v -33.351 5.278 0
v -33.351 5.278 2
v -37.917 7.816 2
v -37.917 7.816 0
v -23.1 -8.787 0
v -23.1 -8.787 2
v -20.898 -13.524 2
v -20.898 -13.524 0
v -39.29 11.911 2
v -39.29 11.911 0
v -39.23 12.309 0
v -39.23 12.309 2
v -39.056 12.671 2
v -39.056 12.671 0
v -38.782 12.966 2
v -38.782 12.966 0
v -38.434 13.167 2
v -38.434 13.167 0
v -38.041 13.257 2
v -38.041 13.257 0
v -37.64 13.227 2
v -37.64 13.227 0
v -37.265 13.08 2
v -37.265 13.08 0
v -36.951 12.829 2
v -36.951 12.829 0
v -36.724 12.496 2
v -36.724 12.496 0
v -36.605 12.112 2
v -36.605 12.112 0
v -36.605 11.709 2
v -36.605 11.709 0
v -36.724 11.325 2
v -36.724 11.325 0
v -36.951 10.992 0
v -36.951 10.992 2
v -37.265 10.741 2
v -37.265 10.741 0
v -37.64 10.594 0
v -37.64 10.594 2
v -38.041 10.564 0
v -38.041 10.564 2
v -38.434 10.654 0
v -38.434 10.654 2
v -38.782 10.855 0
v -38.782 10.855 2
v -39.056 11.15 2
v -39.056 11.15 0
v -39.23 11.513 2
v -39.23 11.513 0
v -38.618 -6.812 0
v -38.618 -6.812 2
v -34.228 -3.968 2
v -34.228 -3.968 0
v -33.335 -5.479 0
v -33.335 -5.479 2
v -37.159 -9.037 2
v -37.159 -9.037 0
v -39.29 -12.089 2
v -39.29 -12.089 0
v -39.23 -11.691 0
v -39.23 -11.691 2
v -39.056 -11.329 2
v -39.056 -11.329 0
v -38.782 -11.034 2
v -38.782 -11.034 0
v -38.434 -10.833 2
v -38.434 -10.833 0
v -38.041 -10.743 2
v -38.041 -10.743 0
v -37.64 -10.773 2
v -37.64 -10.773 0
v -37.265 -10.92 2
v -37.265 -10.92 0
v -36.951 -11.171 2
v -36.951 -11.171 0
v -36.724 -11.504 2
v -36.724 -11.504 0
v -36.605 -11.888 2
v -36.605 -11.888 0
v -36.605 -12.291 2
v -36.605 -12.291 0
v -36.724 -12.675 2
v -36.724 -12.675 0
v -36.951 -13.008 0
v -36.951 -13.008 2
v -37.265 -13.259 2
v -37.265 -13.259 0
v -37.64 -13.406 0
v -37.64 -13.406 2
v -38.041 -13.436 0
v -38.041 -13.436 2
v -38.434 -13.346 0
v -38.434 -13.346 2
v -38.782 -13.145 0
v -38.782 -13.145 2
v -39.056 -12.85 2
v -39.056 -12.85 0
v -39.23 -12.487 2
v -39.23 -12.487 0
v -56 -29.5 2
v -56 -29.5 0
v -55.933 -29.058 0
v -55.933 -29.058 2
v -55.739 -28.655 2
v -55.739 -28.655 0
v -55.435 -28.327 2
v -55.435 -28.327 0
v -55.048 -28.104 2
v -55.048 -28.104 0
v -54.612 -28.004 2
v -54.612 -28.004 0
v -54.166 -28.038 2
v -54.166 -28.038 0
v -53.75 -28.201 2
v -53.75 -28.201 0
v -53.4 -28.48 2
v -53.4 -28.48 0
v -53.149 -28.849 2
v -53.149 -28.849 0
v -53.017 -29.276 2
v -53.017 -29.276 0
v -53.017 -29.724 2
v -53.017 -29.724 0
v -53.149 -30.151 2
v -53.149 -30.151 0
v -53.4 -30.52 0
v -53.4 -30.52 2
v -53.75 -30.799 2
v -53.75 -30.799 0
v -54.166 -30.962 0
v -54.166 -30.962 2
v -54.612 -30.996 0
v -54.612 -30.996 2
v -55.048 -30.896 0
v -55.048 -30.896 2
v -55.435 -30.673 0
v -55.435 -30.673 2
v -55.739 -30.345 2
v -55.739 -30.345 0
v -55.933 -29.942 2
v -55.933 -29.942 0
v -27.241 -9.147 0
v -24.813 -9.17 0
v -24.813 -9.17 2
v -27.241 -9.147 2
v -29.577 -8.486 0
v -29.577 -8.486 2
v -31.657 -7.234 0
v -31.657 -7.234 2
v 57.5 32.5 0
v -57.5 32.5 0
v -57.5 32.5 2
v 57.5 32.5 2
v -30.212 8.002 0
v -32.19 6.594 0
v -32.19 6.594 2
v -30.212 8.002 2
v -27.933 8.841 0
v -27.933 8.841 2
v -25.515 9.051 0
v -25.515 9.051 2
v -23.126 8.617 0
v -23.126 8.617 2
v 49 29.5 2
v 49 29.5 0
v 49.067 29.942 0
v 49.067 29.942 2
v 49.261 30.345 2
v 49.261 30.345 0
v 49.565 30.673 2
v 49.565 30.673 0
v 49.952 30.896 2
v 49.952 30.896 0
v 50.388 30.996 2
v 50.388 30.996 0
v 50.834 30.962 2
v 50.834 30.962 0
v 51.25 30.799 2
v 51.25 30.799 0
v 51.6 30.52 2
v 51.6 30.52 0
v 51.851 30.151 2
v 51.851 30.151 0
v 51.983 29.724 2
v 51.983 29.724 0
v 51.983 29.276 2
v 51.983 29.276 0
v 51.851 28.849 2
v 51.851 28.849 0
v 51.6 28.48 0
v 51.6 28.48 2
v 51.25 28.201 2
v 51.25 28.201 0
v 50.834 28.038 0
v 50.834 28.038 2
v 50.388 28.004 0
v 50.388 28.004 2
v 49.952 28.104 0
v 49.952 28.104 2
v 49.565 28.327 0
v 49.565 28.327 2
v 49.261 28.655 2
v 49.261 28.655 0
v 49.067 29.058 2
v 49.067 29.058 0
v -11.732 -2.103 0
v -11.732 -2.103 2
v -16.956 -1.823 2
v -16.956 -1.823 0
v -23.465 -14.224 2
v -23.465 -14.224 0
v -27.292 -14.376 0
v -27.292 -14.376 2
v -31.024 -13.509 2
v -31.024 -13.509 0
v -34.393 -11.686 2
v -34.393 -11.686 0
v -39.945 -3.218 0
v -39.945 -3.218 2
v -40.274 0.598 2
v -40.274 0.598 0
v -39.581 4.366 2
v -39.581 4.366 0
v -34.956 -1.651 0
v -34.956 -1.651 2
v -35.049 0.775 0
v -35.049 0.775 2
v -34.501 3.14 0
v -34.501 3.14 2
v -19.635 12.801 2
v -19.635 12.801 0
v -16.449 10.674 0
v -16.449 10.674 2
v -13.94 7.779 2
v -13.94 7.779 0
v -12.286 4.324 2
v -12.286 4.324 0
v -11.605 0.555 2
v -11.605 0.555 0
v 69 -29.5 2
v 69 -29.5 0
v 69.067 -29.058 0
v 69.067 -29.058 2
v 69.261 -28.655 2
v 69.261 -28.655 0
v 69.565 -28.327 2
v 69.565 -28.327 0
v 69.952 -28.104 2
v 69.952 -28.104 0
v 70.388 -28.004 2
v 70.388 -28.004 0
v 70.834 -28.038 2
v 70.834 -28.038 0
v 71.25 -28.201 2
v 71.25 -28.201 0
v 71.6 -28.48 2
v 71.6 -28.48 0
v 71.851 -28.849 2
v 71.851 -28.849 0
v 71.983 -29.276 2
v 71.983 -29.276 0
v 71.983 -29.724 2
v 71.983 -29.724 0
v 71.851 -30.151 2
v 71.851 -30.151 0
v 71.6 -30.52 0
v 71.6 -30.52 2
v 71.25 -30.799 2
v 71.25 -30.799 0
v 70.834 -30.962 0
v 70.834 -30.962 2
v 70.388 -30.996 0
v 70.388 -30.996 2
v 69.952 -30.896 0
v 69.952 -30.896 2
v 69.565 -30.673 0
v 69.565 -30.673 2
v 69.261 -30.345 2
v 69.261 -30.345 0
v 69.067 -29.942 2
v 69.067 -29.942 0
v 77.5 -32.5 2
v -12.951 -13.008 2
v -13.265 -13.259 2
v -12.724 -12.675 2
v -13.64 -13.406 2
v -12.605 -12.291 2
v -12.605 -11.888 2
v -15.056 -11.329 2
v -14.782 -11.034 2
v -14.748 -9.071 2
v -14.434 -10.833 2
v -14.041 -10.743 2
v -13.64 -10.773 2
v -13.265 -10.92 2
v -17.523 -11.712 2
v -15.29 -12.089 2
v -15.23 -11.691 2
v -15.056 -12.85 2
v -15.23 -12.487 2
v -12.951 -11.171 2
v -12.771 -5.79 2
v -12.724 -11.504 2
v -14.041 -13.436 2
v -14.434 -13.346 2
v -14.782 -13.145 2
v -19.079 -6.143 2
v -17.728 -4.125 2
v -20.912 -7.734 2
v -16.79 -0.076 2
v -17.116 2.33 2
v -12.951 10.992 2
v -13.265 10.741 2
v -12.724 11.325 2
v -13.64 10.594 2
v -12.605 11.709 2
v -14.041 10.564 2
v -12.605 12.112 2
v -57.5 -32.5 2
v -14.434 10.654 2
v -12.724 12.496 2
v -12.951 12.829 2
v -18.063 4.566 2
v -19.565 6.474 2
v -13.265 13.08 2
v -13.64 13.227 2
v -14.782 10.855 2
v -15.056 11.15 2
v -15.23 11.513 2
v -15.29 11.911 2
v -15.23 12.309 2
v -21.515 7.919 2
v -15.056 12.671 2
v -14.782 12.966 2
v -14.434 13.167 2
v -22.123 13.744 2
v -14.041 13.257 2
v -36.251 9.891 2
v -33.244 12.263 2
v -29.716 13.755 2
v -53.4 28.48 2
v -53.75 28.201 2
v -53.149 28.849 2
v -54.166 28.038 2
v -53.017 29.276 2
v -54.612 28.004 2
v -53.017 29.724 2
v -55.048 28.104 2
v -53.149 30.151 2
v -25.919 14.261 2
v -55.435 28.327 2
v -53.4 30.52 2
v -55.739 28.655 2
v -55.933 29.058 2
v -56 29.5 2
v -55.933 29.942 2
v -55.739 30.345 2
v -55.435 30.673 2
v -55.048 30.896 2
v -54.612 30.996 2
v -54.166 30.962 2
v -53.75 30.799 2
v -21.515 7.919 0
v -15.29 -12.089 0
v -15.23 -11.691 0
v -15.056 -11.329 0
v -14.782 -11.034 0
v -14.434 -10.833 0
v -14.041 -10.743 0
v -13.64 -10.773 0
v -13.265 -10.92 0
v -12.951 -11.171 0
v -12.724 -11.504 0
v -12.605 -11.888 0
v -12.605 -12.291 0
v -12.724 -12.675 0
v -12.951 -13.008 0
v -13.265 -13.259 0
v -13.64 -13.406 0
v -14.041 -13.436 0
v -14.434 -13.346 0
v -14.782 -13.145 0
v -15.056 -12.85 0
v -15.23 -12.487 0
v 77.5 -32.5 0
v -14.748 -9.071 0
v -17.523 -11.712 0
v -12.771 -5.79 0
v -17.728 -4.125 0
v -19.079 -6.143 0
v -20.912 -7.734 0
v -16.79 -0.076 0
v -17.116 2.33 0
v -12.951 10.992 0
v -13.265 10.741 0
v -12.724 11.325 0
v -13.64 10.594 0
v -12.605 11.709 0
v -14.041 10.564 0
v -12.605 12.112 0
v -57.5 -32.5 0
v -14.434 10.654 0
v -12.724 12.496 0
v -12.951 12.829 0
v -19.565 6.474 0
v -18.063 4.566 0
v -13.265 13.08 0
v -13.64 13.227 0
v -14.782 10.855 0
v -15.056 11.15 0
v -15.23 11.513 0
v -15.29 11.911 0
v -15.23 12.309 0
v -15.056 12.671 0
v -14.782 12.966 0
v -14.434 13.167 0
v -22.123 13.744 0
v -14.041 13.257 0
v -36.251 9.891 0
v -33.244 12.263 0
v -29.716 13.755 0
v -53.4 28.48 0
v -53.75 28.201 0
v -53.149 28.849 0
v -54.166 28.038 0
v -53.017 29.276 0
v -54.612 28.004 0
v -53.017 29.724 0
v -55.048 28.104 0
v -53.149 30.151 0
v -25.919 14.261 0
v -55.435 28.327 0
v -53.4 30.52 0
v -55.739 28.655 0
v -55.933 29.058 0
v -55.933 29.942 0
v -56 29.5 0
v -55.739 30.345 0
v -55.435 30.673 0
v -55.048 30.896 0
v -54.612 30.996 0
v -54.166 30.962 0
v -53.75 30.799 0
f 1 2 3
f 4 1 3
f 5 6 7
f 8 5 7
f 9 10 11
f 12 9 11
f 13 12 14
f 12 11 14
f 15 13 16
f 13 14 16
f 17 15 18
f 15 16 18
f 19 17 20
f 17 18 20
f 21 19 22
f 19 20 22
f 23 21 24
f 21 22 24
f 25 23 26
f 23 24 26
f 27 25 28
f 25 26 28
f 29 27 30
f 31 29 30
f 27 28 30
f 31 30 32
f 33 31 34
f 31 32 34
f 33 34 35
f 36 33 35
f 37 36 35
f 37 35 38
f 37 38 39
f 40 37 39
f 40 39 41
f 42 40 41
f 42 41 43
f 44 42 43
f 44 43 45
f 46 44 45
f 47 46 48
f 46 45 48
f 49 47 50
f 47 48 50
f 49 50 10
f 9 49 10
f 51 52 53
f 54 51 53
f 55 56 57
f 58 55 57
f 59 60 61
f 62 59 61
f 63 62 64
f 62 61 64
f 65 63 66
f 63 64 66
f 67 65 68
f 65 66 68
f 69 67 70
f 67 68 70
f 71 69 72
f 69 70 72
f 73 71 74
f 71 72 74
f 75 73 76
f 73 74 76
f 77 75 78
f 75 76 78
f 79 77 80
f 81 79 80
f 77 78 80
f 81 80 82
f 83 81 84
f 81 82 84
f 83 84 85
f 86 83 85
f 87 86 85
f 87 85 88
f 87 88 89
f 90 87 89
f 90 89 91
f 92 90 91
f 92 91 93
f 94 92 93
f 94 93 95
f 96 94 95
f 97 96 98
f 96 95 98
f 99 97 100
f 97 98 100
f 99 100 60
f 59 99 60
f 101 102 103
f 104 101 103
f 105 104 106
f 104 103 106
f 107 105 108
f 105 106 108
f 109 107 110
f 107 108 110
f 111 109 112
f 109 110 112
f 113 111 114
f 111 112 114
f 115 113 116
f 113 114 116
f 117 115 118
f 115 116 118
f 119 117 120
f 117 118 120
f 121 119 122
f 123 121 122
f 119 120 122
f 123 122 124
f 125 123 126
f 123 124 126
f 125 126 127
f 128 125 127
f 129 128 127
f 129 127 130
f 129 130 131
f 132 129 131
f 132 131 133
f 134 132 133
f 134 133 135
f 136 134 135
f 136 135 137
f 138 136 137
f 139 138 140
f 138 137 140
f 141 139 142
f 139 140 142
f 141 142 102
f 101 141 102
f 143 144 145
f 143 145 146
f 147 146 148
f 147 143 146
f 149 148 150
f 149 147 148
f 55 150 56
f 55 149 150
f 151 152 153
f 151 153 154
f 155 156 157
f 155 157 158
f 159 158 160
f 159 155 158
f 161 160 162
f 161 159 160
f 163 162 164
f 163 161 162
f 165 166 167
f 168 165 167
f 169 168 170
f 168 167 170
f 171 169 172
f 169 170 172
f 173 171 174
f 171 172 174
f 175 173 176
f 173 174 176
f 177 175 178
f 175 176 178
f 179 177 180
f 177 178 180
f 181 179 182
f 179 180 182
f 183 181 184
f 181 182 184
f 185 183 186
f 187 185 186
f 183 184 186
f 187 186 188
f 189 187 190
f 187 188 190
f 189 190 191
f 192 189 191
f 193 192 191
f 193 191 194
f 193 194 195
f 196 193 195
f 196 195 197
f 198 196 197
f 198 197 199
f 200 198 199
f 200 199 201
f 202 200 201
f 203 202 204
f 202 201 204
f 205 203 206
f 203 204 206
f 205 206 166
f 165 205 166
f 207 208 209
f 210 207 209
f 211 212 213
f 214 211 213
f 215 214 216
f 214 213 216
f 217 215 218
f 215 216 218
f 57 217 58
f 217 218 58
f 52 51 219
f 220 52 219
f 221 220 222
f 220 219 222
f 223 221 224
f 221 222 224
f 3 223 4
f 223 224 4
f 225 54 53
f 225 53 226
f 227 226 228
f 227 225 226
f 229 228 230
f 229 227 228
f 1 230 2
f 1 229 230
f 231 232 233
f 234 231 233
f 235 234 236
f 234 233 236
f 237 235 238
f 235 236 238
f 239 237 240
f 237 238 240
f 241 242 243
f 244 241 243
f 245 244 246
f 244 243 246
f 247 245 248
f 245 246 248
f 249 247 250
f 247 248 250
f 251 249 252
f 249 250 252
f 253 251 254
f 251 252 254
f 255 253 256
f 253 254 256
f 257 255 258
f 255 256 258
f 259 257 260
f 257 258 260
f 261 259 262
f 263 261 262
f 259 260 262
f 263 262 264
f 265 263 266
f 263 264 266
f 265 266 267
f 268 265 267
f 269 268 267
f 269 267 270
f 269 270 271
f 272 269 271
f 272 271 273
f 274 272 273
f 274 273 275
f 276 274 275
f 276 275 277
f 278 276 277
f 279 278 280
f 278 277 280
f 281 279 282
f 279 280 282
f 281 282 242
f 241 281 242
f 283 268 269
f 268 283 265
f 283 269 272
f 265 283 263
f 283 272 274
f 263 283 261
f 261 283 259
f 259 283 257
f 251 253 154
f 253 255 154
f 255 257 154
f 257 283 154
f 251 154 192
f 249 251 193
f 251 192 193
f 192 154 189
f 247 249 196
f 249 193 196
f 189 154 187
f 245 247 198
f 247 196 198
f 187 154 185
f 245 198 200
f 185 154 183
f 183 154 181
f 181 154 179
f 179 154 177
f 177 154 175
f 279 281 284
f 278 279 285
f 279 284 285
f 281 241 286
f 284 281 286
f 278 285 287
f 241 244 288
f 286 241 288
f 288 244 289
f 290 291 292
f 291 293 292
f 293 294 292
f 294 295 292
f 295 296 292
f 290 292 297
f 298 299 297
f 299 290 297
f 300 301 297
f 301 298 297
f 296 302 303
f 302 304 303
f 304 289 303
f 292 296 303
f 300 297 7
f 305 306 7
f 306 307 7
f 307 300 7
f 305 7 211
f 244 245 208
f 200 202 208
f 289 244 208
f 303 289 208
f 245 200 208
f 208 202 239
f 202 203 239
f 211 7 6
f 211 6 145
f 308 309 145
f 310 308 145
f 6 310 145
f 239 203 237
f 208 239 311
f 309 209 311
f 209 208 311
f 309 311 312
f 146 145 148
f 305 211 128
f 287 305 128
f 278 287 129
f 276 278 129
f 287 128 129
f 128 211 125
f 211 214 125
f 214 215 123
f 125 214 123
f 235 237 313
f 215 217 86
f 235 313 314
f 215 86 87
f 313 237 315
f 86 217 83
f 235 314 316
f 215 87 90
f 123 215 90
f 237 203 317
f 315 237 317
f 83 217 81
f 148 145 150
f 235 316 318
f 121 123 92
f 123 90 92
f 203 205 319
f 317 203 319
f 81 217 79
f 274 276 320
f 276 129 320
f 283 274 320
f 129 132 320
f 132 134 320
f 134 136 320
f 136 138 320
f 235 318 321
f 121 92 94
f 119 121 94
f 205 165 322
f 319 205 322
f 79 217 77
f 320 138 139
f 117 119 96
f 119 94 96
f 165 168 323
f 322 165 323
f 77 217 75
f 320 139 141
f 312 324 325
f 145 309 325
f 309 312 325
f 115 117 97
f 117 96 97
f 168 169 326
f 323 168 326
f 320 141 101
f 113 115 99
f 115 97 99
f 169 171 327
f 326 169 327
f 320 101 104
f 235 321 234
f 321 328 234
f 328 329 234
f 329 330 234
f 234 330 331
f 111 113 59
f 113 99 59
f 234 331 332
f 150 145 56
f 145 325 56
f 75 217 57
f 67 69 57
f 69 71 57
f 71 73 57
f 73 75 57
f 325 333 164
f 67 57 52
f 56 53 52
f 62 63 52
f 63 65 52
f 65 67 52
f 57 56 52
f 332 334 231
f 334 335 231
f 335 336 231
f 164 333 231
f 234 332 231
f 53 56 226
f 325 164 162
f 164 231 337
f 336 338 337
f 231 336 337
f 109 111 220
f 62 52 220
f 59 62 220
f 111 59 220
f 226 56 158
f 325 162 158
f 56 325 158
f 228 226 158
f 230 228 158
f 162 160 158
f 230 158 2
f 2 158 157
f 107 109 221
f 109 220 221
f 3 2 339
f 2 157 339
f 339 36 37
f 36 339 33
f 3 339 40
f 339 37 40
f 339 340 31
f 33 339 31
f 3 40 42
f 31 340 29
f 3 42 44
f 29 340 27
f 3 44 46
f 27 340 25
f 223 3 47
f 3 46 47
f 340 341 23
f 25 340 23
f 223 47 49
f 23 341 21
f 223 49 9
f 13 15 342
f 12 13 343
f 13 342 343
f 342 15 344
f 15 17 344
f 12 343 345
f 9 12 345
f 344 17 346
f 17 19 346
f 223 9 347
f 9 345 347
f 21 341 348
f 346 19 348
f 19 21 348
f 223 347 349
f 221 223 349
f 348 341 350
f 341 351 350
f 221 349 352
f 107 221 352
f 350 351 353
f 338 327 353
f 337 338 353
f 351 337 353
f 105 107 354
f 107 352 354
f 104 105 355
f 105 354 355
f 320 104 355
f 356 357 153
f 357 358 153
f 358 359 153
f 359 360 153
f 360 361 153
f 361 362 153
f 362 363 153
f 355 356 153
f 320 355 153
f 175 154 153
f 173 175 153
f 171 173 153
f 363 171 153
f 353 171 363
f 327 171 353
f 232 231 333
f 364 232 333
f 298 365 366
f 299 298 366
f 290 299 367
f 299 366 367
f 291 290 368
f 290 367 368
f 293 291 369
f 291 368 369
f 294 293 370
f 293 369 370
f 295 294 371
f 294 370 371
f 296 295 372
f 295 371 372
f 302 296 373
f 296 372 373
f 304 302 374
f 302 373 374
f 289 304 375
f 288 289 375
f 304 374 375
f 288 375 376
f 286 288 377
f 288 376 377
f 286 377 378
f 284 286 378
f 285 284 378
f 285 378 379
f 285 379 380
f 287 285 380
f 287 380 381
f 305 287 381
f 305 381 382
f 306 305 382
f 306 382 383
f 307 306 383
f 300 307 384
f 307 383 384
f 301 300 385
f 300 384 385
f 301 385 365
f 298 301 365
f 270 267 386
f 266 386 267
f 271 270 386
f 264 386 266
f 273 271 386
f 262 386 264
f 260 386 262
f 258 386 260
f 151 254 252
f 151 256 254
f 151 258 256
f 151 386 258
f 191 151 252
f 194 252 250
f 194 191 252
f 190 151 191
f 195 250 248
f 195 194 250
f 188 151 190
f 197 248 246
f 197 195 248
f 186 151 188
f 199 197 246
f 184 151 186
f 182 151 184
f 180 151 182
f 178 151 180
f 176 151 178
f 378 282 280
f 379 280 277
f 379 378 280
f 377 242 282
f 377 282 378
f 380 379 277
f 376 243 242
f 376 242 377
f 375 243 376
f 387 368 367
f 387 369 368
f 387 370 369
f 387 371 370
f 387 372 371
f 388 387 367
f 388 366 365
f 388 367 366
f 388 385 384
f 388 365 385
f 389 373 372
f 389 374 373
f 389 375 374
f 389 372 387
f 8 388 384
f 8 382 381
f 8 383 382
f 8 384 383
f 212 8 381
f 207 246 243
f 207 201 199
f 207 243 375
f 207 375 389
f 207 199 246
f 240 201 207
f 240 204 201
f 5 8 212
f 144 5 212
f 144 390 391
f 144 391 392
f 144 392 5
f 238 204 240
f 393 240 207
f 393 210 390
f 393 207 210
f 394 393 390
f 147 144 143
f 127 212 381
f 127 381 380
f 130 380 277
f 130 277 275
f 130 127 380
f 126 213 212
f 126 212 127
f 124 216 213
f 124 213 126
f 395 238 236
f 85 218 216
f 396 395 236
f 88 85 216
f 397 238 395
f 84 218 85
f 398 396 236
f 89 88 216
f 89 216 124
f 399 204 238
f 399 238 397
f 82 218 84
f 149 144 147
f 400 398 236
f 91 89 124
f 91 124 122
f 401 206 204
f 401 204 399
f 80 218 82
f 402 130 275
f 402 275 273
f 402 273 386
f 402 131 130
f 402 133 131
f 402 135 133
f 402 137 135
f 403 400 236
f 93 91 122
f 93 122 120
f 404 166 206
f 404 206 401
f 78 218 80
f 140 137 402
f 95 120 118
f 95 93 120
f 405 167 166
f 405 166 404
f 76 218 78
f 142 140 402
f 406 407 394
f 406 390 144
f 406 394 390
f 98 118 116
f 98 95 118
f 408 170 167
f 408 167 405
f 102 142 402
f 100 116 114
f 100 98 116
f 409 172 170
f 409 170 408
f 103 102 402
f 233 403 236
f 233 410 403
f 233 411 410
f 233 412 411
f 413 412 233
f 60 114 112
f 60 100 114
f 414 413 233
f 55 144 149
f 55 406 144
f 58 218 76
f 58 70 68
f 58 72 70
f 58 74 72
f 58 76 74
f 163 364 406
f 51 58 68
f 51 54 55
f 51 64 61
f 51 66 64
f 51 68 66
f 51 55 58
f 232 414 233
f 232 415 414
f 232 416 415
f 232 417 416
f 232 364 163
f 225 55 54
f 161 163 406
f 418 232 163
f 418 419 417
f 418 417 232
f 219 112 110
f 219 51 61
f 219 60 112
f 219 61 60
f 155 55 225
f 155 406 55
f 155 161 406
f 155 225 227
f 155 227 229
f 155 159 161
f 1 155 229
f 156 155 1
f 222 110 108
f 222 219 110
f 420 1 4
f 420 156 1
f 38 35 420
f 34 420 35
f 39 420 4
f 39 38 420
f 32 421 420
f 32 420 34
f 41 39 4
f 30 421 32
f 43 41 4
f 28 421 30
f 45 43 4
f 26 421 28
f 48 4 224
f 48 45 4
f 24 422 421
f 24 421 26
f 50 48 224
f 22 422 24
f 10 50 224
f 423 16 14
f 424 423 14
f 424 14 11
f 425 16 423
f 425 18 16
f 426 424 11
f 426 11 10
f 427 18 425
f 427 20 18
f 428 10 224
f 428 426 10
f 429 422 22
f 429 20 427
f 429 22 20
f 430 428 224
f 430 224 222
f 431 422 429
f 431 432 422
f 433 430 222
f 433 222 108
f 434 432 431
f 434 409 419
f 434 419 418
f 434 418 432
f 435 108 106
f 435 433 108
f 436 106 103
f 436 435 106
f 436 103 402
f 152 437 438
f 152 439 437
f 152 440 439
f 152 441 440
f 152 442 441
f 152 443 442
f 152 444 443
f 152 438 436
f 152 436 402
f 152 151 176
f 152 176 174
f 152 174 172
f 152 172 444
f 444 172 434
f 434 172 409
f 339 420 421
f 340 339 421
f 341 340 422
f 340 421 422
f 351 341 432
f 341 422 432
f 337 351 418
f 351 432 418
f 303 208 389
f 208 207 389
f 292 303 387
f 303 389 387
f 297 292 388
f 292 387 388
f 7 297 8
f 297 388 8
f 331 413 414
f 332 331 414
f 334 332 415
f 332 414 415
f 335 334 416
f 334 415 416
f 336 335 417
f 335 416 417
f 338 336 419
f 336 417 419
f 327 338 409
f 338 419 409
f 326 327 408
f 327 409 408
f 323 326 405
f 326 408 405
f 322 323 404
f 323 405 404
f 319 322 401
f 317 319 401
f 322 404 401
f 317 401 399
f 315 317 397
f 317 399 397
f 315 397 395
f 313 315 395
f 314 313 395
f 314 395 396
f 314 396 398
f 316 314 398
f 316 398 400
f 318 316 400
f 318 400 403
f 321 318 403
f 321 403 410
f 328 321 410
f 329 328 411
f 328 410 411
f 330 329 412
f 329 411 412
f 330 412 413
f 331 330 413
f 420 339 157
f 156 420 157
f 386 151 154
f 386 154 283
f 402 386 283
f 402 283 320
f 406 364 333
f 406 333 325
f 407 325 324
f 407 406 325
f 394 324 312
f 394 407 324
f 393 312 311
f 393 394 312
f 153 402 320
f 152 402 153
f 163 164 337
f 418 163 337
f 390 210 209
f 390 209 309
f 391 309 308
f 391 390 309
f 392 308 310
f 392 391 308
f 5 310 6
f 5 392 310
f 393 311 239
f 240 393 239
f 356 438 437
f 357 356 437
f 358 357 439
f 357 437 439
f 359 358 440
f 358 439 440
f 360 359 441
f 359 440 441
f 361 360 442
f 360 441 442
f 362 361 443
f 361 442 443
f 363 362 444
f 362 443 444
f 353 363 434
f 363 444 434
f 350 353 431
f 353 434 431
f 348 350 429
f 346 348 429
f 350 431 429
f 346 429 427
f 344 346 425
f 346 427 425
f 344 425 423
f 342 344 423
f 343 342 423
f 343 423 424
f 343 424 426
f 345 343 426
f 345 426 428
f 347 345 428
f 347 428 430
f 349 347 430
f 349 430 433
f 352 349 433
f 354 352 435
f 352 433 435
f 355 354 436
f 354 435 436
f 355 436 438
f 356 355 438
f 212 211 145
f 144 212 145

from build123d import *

# Parameters (mm, degrees)
CROQUIS1_W              = 115
CROQUIS1_H              = 65
SALIENTE_EXTRUIR1_DEPTH = 2
SALIENTE_EXTRUIR2_DEPTH = 2
CROQUIS3_R              = 1.5
CORTAR_EXTRUIR1_DEPTH   = 2
CROQUIS4_R              = 1.35
CROQUIS4_R_2            = 14.35
CROQUIS4_R_3            = 9.15
CORTAR_EXTRUIR3_DEPTH   = 2
CROQUIS5_R              = 1.366917162
SALIENTE_EXTRUIR3_DEPTH = 2
MATRIZC1_COUNT          = 5


with BuildPart() as part:
    # Croquis1 → Saliente-Extruir1 (new body)
    with BuildSketch(Plane.XY):
        Rectangle(CROQUIS1_W, CROQUIS1_H)
    extrude(amount=SALIENTE_EXTRUIR1_DEPTH)

    # Croquis2 → Saliente-Extruir2 (add)
    with BuildSketch(Plane(origin=(0, 0, 0), x_dir=(-1, 0, 0), z_dir=(0, 0, -1))):
        Polygon((-57.5, 32.5), (-77.5, -32.5), (-57.5, -32.5), align=None)
    extrude(amount=-SALIENTE_EXTRUIR2_DEPTH)

    # Croquis3 → Cortar-Extruir1 (cut)
    with BuildSketch(Plane(origin=(0, 0, 0), x_dir=(-1, 0, 0), z_dir=(0, 0, -1))):
        with Locations((-50.5, 29.5)):
            Circle(CROQUIS3_R)
        with Locations((-70.5, -29.5)):
            Circle(CROQUIS3_R)
        with Locations((54.5, -29.5)):
            Circle(CROQUIS3_R)
        with Locations((54.5, 29.5)):
            Circle(CROQUIS3_R)
    extrude(amount=-CORTAR_EXTRUIR1_DEPTH, mode=Mode.SUBTRACT)

    # Croquis4 → Cortar-Extruir3 (cut)
    # profile 1 of 5: a face of its own
    with BuildSketch(Plane(origin=(0, 0, 0), x_dir=(-1, 0, 0), z_dir=(0, 0, -1))):
        with Locations((13.94030488, 11.910589373)):
            Circle(CROQUIS4_R)
    # profile 2 of 5: a face of its own
    with BuildSketch(Plane(origin=(0, 0, 0), x_dir=(-1, 0, 0), z_dir=(0, 0, -1))):
        with Locations((37.94030488, 11.910589373)):
            Circle(CROQUIS4_R)
    # profile 3 of 5: a face of its own
    with BuildSketch(Plane(origin=(0, 0, 0), x_dir=(-1, 0, 0), z_dir=(0, 0, -1))):
        with Locations((37.94030488, -12.089410627)):
            Circle(CROQUIS4_R)
    # profile 4 of 5: a face of its own
    with BuildSketch(Plane(origin=(0, 0, 0), x_dir=(-1, 0, 0), z_dir=(0, 0, -1))):
        with Locations((13.94030488, -12.089410627)):
            Circle(CROQUIS4_R)
    # profile 5 of 5: a face of its own
    with BuildSketch(Plane(origin=(0, 0, 0), x_dir=(-1, 0, 0), z_dir=(0, 0, -1))):
        with Locations((25.94030488, -0.089410627)):
            Circle(CROQUIS4_R_2)
        with Locations((25.94030488, -0.089410627)):
            Circle(CROQUIS4_R_3, mode=Mode.SUBTRACT)
    extrude(amount=-CORTAR_EXTRUIR3_DEPTH, mode=Mode.SUBTRACT)


with BuildPart() as cortar_extruir3_piece_1:
    # of the separate pieces the step leaves, piece 1, a body of its own (cortar_extruir3_pieces)
    add(part.part.solids().sort_by_distance((-57.5, -32.5, 0))[0])



with BuildPart() as cortar_extruir3_piece_2:
    # of the separate pieces the step leaves, piece 2, a body of its own (cortar_extruir3_pieces)
    add(part.part.solids().sort_by_distance((-35.09030488, -0.089410627, 2))[0])


with BuildPart() as cortar_extruir3_piece_1_1:
    add(cortar_extruir3_piece_1.part)

    add(cortar_extruir3_piece_2.part)  # Saliente-Extruir3 merges Cortar-Extruir3 piece 2
    # Croquis5 → Saliente-Extruir3 (add)
    with BuildSketch(Plane.XY.offset(2)):
        with Locations((-25.94030488, -0.089410627)):
            Circle(CROQUIS5_R)
        with BuildLine():
            Line((-38.61837968, -6.811681029), (-34.227775342, -3.967597491))
            ThreePointArc((-34.227775342, -3.967597491), (-33.817608325, -4.744578769), (-33.334811119, -5.478638539))
            Line((-33.334811119, -5.478638539), (-37.159332333, -9.036808182))
            ThreePointArc((-37.159332333, -9.036808182), (-37.9405412, -7.958135318), (-38.61837968, -6.811681029))
        make_face()
    saliente_extruir3 = extrude(amount=-SALIENTE_EXTRUIR3_DEPTH)

    # MatrizC1: Saliente-Extruir3 ×5 about axis
    matrizc1_axis = Axis((-25.94030488, -0.089410627, 0), (0, 0, 1))
    for i in range(1, MATRIZC1_COUNT):
        add(saliente_extruir3.rotate(matrizc1_axis, i * 360 / MATRIZC1_COUNT))


solid = cortar_extruir3_piece_1_1.part
